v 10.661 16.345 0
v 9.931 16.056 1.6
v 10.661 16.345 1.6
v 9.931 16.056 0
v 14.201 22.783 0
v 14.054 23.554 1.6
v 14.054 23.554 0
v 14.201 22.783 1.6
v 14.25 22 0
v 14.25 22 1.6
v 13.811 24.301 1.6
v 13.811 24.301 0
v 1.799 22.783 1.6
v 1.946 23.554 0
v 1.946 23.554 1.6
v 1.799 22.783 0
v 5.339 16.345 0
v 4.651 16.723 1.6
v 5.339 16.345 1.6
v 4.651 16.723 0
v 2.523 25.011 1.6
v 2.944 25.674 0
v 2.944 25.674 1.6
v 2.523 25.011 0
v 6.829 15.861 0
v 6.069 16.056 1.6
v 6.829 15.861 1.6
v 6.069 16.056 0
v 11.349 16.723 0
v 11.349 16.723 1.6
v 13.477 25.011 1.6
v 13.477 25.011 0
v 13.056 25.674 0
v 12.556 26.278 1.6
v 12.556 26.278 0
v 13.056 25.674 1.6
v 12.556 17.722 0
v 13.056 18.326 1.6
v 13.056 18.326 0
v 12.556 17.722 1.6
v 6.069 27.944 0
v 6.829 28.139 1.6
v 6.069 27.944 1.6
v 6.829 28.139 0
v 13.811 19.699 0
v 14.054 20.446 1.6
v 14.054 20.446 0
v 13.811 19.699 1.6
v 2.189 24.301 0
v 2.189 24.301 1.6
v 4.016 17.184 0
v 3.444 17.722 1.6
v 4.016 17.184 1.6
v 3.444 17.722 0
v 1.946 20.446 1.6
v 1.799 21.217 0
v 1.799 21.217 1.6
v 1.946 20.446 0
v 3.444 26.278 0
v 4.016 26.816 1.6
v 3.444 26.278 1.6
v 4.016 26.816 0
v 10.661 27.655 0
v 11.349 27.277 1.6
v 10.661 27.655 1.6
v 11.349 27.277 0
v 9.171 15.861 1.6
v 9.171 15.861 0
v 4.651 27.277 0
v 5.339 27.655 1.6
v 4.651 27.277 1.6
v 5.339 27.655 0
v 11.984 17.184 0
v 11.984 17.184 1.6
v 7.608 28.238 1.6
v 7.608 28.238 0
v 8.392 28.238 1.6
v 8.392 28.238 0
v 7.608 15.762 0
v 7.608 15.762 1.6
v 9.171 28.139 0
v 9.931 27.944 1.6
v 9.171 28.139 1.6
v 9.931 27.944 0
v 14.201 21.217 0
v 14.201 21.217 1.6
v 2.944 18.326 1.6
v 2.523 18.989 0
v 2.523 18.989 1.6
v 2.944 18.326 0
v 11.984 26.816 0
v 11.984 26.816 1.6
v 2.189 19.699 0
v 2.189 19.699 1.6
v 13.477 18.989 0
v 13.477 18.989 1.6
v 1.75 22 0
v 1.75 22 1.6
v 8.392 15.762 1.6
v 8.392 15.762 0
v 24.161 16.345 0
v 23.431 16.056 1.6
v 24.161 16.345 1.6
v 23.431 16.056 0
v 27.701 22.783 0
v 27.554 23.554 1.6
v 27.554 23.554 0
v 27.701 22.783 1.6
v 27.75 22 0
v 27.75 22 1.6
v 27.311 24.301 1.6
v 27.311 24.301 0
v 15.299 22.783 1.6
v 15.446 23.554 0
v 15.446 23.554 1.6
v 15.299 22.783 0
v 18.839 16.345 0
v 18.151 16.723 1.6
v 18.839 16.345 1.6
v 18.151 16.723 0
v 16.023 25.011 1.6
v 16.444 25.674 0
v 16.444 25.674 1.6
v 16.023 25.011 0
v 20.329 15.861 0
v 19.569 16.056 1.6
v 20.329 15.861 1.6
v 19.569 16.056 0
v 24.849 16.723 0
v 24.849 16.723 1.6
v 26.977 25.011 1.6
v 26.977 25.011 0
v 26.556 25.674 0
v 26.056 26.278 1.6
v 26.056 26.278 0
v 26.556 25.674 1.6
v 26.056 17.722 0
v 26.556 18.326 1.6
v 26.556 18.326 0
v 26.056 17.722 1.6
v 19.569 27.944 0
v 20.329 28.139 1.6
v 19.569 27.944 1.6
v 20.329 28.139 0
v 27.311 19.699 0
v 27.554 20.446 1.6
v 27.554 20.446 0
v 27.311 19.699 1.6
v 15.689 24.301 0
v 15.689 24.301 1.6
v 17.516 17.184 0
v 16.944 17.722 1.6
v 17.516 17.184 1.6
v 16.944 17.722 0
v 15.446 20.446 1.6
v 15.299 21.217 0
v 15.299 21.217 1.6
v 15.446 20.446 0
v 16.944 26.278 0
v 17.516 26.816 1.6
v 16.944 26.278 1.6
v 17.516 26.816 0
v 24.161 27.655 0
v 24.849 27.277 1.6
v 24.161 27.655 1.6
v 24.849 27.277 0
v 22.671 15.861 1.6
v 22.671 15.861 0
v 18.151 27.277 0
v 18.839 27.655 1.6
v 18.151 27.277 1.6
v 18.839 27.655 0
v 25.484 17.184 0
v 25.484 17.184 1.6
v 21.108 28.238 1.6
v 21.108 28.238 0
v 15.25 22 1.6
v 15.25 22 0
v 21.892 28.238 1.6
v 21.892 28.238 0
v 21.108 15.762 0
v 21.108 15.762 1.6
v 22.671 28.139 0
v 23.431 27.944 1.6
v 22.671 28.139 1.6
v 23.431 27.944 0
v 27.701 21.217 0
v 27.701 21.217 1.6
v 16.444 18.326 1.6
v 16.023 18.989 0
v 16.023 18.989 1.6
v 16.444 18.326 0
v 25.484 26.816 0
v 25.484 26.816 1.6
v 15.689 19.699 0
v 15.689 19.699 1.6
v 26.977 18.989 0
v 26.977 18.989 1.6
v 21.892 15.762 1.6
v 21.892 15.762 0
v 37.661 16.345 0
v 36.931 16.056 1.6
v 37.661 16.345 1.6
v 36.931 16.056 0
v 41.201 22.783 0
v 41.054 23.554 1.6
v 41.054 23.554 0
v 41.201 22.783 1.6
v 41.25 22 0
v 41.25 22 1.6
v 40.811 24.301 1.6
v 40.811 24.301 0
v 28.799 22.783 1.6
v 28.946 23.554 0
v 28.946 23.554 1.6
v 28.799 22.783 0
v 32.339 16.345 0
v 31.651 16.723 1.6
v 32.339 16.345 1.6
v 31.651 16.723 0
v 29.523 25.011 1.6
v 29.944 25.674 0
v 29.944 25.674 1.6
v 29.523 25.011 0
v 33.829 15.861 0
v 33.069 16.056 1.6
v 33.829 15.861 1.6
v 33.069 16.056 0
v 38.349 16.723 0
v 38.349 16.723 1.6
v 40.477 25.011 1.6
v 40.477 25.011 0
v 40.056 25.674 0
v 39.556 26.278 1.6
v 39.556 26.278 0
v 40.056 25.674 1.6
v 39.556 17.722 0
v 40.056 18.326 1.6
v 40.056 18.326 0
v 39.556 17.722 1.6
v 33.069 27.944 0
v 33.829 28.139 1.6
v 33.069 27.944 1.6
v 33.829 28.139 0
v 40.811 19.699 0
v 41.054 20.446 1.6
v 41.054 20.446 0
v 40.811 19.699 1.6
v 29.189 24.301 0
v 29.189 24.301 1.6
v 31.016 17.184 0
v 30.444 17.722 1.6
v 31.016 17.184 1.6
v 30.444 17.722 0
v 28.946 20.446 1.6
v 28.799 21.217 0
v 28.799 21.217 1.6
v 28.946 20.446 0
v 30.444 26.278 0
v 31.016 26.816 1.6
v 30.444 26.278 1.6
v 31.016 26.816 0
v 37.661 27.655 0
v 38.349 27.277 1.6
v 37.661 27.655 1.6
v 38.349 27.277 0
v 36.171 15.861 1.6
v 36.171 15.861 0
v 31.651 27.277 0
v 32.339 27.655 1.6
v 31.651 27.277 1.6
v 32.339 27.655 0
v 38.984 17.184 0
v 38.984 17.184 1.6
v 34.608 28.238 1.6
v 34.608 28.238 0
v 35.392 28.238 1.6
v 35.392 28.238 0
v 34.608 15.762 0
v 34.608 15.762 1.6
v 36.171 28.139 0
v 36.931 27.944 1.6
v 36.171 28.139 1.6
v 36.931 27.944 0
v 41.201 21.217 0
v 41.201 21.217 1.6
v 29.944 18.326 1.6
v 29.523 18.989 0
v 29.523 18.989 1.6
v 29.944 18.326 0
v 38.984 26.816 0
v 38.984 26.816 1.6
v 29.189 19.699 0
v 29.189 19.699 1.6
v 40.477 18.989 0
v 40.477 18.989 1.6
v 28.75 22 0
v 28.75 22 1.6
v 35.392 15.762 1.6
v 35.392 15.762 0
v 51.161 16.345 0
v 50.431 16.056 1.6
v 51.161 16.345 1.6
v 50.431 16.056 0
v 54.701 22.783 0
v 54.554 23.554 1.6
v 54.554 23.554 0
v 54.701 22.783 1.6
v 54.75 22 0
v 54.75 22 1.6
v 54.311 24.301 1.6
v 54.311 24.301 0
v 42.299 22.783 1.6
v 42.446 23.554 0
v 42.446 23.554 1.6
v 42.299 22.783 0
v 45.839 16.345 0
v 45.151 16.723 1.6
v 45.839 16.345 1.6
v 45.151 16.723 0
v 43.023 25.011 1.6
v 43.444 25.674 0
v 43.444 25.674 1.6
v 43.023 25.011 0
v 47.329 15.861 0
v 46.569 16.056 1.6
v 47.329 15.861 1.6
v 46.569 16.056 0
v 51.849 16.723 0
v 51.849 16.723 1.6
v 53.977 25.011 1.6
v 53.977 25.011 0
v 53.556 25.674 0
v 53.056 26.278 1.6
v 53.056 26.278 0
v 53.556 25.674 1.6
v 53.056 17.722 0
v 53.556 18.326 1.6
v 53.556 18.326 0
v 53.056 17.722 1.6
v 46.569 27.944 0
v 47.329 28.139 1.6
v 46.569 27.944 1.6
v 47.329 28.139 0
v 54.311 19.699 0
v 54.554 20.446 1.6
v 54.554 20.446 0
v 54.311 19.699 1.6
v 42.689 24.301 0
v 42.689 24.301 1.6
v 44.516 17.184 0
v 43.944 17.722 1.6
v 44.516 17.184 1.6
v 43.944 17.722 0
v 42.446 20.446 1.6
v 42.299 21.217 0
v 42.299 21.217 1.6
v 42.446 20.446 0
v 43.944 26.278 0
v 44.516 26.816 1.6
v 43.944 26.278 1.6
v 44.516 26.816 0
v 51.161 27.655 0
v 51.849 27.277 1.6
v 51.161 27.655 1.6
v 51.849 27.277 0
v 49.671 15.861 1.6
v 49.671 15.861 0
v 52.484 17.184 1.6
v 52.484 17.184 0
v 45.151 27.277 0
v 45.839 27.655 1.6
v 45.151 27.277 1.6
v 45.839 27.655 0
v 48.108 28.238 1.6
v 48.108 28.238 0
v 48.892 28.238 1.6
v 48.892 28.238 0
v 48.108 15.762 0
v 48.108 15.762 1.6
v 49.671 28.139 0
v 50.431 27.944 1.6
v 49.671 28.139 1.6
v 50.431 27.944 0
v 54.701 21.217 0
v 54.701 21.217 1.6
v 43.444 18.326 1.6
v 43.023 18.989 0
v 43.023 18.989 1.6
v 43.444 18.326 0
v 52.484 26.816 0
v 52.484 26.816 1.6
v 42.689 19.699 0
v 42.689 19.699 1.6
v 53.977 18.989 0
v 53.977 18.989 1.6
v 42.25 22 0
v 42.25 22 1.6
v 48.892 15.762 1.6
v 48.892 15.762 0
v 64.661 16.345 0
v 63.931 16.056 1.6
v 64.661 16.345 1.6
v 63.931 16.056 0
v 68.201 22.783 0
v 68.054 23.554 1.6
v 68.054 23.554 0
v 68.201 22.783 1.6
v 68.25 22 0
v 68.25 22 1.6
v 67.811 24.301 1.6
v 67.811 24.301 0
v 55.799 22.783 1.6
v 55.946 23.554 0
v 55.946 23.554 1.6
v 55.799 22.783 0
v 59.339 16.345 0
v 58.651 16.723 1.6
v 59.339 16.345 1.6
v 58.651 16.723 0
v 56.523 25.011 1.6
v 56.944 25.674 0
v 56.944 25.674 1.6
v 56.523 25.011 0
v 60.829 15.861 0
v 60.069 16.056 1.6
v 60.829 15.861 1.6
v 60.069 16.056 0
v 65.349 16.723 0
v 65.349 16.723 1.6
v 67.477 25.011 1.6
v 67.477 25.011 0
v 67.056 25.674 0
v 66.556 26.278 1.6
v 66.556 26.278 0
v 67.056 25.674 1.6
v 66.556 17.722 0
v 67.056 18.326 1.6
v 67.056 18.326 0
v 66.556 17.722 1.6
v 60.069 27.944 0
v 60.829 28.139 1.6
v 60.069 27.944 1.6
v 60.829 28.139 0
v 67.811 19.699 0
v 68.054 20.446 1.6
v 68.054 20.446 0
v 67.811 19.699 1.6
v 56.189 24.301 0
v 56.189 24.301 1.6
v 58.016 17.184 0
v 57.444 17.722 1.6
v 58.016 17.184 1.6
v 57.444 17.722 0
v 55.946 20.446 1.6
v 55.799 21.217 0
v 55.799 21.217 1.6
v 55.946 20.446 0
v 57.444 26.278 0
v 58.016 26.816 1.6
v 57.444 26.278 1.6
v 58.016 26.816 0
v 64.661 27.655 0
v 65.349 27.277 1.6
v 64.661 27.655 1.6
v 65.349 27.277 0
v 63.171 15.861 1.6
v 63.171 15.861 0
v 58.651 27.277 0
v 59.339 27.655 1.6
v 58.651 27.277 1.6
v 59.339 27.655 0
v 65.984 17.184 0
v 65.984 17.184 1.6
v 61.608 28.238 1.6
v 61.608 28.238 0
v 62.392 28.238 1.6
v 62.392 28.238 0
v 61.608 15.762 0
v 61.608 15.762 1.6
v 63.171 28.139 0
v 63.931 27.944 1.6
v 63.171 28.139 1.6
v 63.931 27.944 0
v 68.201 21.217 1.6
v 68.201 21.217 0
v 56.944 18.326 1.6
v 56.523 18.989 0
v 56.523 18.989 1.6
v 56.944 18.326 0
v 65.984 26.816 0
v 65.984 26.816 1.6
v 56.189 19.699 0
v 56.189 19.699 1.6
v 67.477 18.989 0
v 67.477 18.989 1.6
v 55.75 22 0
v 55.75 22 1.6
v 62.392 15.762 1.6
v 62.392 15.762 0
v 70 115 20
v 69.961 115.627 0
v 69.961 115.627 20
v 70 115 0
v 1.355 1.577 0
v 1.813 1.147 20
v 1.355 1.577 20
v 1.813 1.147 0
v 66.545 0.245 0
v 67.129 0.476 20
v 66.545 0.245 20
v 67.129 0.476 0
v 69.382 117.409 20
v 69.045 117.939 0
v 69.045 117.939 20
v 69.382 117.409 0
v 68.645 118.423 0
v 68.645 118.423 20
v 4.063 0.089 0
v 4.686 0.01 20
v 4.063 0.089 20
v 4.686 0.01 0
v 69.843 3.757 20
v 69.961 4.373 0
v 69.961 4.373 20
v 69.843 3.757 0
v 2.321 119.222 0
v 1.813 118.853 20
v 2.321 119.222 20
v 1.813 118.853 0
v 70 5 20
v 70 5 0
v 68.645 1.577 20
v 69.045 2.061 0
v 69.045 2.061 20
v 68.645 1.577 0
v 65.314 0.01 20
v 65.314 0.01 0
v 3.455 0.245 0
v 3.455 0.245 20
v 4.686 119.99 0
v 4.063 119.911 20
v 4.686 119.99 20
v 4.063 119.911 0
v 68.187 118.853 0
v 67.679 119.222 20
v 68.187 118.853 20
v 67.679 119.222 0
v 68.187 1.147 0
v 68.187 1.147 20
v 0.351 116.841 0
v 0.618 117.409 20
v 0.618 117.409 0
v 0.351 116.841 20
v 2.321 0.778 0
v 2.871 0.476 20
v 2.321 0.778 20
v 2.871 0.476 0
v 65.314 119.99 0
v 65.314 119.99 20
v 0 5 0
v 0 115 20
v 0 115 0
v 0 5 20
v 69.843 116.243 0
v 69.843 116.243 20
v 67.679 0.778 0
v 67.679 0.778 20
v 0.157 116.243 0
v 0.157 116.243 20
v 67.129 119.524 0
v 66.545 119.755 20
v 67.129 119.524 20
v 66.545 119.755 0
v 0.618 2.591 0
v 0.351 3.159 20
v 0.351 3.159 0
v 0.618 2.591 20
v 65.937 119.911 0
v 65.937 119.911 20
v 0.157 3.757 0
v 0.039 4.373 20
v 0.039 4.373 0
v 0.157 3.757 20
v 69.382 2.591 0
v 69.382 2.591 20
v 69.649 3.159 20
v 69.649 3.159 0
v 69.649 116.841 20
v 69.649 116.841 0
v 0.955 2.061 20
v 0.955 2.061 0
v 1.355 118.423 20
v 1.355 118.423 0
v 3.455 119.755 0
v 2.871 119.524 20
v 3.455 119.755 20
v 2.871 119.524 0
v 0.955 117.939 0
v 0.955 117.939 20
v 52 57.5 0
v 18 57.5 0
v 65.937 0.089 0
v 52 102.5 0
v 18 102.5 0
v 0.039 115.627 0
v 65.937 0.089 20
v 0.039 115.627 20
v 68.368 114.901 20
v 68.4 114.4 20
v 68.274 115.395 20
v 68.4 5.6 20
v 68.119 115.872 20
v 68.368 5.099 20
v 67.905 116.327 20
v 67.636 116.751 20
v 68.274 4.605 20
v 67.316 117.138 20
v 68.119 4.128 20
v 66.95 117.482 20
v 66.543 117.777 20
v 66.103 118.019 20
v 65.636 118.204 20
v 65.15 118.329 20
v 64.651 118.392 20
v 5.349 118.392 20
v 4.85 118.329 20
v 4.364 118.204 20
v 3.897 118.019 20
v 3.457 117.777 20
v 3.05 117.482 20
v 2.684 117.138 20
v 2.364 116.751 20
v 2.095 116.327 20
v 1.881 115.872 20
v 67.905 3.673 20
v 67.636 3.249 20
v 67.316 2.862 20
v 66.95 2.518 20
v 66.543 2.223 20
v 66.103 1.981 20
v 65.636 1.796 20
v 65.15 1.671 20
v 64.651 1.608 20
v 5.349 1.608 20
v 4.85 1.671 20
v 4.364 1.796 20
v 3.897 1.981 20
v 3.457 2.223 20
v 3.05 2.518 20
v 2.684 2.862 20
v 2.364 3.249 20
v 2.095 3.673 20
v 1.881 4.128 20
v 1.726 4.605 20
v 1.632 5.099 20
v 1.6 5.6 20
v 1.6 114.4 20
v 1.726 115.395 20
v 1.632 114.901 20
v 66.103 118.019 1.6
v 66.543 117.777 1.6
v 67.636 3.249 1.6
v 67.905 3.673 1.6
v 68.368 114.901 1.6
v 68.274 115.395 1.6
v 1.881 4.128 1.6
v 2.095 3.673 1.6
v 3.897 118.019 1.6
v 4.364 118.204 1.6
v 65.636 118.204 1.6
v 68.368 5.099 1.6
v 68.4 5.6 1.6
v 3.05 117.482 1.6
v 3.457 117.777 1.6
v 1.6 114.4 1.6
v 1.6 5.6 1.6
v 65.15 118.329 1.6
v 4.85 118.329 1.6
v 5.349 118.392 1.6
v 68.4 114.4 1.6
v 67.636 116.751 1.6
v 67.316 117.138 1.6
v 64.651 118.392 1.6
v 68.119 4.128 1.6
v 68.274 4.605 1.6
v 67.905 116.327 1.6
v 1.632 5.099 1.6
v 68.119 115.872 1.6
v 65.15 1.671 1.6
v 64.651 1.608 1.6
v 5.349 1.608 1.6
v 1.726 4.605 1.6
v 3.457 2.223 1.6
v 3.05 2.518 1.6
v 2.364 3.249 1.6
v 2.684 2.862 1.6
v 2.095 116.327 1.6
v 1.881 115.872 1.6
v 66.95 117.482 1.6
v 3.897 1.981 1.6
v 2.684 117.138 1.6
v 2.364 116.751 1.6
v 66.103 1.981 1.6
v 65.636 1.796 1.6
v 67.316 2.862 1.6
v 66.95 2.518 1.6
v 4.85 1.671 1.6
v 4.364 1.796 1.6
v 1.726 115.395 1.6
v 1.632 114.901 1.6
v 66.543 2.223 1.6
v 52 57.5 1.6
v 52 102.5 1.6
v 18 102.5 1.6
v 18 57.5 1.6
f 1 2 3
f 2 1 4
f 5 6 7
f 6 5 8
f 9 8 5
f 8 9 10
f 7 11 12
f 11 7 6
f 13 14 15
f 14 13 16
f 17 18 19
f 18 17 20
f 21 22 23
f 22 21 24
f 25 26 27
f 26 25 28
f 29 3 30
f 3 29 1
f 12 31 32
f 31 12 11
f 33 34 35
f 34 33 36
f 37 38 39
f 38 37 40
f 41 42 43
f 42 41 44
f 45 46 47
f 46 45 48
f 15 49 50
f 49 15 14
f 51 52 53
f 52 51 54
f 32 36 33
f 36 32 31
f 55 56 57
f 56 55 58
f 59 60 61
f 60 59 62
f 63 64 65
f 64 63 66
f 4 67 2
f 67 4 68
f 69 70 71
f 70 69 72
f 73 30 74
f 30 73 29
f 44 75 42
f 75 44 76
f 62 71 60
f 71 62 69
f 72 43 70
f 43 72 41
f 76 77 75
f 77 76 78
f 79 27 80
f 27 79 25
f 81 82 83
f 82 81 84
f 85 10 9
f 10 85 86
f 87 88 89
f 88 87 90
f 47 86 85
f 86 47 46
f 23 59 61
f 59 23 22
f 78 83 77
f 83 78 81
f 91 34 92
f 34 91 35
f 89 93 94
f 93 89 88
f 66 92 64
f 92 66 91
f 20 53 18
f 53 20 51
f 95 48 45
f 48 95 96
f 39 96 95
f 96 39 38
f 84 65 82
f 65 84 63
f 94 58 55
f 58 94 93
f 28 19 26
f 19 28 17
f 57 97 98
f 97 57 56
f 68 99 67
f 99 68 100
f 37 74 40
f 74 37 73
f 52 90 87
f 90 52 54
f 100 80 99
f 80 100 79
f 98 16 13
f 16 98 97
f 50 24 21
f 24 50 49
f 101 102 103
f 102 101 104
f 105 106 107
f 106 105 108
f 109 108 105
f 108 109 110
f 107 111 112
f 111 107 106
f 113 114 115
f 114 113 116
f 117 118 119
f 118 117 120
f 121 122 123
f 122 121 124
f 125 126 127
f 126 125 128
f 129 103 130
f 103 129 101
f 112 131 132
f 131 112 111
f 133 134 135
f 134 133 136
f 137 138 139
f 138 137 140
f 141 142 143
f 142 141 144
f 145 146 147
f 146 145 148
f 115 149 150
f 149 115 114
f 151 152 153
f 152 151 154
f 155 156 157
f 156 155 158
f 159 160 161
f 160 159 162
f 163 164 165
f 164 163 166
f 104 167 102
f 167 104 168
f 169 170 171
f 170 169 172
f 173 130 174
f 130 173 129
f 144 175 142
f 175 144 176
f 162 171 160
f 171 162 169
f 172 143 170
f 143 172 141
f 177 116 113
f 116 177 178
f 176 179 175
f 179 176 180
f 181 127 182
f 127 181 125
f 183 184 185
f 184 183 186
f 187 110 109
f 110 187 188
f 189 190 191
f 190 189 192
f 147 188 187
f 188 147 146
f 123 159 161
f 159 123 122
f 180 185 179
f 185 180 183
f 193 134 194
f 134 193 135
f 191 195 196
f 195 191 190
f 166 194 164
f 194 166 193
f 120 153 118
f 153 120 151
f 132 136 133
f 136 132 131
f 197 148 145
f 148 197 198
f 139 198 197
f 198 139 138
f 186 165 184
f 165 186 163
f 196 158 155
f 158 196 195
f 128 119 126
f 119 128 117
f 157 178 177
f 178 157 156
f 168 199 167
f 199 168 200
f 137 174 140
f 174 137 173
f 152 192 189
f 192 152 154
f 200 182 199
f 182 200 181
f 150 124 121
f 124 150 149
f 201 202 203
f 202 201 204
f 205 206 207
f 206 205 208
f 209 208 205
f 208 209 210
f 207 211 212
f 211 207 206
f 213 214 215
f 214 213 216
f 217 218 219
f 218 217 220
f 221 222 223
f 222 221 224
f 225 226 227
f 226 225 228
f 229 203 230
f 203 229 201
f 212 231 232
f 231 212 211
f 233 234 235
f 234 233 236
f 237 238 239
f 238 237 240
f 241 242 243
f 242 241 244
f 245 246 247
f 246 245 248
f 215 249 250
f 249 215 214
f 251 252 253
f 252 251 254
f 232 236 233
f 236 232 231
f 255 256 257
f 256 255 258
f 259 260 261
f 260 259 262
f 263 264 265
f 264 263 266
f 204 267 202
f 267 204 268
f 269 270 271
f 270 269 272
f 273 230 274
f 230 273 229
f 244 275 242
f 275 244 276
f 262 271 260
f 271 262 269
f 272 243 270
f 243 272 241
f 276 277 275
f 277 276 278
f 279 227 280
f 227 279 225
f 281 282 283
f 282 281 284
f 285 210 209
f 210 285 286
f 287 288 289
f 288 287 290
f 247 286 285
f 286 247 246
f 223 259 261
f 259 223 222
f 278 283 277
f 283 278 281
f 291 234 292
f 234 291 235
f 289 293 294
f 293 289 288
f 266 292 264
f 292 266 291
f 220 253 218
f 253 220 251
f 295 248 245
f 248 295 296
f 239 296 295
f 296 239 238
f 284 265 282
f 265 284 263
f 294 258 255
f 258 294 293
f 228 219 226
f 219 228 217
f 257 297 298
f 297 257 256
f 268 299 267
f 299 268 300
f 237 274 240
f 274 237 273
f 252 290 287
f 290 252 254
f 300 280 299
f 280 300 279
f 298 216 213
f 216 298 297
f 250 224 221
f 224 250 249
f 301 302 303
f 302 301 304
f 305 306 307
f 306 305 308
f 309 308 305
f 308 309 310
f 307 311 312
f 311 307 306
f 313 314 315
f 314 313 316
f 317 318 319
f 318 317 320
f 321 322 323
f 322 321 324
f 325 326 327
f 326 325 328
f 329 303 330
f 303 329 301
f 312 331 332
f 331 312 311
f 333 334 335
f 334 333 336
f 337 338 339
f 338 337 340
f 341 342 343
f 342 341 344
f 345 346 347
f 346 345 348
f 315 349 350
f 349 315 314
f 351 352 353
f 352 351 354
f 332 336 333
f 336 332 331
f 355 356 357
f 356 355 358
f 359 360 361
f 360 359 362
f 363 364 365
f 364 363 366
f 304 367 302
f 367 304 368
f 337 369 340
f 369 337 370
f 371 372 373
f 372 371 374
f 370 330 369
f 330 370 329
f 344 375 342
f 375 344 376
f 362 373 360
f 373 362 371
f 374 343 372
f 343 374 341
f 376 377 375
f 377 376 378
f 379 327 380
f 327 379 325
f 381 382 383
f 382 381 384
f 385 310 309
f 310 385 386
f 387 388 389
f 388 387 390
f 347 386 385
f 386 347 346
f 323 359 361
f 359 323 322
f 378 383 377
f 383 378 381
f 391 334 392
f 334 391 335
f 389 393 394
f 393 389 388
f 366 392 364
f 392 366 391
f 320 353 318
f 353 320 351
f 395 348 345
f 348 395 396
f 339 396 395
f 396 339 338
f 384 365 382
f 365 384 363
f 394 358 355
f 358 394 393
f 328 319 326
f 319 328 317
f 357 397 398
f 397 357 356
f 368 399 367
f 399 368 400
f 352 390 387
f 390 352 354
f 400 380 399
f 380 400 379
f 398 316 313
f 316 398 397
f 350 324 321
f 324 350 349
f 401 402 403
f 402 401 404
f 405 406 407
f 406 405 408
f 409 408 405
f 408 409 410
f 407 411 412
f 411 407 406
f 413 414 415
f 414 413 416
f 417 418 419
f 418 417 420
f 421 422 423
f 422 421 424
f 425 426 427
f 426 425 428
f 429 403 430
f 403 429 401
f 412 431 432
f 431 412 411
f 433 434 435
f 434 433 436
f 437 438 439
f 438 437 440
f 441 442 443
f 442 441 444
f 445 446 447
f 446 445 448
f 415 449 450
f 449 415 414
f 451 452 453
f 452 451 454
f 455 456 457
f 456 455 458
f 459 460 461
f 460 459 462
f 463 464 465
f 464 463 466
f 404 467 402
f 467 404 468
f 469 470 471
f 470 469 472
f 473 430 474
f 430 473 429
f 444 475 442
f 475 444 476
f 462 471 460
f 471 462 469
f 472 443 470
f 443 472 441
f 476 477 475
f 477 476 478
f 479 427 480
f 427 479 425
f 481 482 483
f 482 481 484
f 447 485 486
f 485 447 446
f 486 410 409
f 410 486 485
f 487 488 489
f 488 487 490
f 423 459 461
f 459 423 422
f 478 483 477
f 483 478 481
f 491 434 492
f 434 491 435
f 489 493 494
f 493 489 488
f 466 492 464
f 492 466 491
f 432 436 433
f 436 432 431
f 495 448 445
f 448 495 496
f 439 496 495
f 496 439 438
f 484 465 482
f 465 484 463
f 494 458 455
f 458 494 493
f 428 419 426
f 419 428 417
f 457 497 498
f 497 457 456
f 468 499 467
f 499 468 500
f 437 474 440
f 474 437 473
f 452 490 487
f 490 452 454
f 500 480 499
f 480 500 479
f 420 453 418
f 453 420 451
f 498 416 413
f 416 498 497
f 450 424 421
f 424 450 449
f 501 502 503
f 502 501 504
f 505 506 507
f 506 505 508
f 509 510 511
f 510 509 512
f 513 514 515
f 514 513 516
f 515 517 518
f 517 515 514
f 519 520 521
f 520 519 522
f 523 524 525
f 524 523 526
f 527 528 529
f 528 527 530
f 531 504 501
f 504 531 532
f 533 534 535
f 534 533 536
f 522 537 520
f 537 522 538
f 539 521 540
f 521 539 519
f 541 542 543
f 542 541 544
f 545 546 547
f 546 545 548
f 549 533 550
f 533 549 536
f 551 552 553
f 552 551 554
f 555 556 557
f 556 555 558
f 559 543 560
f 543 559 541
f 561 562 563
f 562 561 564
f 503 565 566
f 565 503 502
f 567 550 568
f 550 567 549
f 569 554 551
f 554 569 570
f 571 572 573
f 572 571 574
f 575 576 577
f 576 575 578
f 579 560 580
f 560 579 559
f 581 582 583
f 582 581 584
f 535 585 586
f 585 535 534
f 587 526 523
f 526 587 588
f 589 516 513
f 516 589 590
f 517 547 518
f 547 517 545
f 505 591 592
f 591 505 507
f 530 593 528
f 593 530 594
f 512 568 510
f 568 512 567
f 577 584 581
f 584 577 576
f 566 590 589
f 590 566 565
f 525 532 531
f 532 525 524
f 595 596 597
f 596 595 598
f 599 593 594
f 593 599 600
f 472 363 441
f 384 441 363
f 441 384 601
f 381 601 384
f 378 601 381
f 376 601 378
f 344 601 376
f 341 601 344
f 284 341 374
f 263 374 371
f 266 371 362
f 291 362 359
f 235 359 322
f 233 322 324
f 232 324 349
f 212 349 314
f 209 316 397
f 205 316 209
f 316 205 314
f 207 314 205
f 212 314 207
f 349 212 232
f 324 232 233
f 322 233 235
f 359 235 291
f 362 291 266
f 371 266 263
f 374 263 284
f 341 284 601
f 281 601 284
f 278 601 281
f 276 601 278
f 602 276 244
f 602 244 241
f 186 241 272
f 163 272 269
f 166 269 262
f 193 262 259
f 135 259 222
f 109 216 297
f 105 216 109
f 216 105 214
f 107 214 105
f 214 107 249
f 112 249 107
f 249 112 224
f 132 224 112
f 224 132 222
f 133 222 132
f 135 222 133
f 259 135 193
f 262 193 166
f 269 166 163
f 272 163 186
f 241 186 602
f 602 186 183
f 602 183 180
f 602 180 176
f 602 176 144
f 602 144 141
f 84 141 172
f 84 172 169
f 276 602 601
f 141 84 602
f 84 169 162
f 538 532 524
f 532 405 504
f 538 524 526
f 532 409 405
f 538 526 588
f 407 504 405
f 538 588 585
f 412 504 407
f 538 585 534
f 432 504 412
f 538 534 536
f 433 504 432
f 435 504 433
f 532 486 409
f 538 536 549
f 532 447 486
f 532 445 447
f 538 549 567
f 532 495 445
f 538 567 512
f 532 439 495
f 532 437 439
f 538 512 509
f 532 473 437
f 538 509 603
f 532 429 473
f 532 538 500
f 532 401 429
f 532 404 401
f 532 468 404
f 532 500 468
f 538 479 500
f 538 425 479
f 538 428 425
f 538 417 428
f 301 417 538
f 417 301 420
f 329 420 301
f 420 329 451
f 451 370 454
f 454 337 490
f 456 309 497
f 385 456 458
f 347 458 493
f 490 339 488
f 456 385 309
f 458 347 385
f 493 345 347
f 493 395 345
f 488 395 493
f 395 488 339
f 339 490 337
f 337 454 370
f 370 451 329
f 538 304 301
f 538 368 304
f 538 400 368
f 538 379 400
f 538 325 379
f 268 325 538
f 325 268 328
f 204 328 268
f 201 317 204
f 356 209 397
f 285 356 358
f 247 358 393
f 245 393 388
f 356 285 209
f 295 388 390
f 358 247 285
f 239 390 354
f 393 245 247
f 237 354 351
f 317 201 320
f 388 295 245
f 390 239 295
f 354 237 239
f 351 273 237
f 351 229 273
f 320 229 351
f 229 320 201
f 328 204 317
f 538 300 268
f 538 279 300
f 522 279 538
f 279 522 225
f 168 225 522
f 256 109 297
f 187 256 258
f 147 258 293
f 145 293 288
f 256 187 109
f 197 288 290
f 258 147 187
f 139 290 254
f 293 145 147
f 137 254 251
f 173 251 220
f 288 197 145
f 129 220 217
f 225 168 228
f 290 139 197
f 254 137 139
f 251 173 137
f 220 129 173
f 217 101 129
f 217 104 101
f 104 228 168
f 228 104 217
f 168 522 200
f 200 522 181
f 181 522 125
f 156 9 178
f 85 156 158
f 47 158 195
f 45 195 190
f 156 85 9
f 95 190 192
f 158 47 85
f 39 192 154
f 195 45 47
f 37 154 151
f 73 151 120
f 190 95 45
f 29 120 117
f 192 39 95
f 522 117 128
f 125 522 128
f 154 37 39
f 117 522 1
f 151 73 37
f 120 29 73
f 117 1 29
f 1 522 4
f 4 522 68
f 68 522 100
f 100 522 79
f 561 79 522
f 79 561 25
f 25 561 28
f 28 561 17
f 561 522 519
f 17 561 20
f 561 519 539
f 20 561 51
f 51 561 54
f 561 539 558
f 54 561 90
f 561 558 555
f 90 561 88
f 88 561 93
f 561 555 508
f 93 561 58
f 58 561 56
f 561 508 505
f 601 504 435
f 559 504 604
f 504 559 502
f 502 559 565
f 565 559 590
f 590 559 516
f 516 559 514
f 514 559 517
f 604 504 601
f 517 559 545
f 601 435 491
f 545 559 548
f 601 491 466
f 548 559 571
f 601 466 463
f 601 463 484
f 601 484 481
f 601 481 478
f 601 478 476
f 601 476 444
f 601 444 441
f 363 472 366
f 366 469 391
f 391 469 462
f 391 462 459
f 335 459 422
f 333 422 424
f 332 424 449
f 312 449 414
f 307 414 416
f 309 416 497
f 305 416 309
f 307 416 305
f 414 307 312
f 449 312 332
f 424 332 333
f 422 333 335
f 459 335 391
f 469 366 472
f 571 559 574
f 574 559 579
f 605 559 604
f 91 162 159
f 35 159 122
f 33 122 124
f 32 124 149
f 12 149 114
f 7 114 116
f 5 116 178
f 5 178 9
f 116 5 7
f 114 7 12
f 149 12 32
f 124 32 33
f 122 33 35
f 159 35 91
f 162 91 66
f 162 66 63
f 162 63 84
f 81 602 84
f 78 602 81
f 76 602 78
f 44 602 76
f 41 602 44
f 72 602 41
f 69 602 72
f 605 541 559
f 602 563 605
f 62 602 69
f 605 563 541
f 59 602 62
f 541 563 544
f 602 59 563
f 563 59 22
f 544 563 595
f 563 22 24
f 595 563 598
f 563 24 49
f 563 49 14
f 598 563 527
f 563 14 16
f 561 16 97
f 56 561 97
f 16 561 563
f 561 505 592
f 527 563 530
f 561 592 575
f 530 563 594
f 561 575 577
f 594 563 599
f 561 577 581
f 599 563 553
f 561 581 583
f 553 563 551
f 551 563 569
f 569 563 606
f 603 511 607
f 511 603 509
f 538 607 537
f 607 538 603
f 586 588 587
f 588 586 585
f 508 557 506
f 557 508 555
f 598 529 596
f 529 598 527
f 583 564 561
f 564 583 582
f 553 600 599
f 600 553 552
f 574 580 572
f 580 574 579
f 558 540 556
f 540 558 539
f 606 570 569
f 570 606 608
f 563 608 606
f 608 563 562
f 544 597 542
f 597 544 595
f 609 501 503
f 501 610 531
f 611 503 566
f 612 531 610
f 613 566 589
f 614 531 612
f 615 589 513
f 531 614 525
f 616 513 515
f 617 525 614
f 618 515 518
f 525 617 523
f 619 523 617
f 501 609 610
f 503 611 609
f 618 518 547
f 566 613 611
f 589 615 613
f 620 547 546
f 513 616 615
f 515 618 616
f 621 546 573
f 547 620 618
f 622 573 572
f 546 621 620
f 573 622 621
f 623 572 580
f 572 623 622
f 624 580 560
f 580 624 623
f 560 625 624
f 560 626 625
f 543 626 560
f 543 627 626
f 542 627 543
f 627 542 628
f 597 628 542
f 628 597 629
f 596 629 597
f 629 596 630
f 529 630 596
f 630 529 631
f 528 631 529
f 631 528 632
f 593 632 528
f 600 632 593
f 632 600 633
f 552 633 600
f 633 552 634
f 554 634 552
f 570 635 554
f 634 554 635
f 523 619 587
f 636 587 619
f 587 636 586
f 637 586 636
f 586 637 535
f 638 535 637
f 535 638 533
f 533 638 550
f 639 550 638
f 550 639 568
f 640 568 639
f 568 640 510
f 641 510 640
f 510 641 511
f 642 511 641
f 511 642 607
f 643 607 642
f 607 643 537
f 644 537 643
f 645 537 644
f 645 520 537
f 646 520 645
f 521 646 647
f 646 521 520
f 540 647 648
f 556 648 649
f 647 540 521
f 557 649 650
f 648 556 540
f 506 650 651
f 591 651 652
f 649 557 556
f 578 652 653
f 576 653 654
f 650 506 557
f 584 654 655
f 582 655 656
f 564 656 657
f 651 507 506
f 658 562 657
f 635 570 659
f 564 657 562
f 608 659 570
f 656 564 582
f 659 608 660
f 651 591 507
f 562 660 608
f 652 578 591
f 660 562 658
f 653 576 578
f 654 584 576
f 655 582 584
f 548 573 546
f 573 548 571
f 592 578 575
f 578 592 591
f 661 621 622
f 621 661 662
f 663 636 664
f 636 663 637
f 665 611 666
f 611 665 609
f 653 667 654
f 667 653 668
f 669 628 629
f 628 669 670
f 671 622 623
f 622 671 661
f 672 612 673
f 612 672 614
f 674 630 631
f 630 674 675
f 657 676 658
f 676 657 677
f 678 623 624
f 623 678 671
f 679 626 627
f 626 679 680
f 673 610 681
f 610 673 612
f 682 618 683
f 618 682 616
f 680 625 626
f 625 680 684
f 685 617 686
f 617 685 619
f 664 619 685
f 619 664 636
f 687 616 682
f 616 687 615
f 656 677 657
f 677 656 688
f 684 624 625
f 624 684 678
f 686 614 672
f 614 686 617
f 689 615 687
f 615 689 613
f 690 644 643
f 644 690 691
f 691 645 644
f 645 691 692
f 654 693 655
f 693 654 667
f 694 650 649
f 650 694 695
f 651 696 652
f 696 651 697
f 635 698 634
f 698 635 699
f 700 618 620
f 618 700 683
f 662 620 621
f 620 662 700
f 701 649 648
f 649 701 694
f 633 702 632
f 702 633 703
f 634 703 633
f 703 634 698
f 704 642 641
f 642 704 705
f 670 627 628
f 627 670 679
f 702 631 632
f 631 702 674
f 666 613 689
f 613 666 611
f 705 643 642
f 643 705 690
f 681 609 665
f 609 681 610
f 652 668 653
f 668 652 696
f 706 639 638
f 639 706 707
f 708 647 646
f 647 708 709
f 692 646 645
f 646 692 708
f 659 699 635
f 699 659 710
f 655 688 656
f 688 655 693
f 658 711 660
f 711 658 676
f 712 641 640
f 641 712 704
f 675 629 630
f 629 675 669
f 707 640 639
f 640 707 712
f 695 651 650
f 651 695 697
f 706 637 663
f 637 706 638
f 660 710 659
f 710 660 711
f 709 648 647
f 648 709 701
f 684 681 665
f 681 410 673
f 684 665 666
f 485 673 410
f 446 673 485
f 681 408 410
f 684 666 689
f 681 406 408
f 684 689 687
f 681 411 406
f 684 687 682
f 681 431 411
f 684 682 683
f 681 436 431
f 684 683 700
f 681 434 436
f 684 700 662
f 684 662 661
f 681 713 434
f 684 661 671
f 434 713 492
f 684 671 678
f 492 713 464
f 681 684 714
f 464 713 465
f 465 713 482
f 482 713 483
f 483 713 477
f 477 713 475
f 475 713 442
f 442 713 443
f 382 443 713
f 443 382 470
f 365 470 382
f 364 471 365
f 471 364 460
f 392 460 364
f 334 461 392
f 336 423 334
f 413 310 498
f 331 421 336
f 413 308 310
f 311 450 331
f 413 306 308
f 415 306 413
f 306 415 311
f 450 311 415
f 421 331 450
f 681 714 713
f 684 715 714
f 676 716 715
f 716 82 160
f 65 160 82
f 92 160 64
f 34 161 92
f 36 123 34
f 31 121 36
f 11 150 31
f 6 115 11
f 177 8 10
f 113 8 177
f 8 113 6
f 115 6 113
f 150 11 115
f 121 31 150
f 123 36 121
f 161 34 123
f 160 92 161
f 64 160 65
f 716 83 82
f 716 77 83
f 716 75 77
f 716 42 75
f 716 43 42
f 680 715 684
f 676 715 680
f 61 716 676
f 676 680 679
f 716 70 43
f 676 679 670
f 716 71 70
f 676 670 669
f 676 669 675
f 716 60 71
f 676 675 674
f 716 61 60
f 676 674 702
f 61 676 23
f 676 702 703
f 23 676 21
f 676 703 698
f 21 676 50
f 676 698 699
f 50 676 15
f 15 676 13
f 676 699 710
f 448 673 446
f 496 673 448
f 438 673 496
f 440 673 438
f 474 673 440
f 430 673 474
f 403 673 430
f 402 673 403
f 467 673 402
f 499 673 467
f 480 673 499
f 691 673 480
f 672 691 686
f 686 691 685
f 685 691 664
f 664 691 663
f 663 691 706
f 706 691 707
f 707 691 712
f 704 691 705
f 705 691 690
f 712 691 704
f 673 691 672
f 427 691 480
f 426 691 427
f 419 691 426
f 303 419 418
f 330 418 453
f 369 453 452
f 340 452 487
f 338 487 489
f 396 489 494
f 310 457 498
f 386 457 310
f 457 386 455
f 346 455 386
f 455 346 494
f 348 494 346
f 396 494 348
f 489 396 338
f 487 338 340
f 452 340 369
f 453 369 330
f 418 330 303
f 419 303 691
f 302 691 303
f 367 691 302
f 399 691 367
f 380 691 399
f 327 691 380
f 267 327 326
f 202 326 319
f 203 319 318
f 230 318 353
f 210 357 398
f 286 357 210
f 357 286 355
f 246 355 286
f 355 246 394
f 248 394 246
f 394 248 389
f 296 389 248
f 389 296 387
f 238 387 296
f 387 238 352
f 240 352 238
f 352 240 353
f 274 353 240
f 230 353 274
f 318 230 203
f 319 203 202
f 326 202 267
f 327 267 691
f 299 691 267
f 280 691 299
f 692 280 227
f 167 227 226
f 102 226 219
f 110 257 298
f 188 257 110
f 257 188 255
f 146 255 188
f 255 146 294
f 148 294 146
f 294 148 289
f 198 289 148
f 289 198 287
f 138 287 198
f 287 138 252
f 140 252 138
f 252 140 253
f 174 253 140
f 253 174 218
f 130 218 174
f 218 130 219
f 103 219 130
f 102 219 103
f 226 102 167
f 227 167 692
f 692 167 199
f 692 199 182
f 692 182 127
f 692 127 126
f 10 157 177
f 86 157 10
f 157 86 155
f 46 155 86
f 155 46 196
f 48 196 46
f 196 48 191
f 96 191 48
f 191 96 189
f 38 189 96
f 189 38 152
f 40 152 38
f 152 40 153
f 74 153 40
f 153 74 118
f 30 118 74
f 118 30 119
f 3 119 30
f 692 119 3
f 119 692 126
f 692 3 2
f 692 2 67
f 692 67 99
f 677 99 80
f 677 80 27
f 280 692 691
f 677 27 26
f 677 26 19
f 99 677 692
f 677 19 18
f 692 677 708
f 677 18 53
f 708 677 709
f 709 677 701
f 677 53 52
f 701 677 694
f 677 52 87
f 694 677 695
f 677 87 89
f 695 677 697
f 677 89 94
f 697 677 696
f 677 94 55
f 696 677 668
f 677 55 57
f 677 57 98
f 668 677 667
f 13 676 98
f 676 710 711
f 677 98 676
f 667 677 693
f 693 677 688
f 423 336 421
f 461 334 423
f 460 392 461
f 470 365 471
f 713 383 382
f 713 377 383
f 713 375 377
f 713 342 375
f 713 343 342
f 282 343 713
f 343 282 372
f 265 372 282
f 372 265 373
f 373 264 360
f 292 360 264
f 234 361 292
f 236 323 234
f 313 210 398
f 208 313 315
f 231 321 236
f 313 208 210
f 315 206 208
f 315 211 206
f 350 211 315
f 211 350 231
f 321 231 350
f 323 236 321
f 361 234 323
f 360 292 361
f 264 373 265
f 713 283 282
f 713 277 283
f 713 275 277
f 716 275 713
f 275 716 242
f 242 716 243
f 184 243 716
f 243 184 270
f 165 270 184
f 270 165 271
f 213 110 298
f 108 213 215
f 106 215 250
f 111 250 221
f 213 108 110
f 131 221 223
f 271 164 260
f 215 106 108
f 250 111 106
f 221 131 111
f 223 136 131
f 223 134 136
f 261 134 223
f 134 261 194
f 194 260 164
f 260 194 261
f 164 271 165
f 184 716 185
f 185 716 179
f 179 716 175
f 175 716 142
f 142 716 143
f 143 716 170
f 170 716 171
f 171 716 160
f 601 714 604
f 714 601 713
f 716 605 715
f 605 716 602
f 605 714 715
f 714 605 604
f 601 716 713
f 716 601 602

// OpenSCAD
// ==========================================
// NOVA PAY EDC REPLICA - MASTER PROJECT FILE
// Optimized for Bambu Lab A1 Mini (No Supports, < 1 Hour)
// ==========================================

// --- GLOBAL DIMENSIONS ---
length = 120;
width = 70;
top_height = 20;     // Deep enough to clear ESP32 jumper wires
bottom_height = 8;
wall = 1.6;          // Fast printing (4 perimeters on 0.4mm nozzle)
radius = 5;
tolerance = 0.2;     // Snug friction fit gap

// Helper Module for Rounded Boxes (Keeps code clean)
module rounded_box(l, w, h, r) {
    hull() {
        translate([r, r, 0]) cylinder(h=h, r=r, $fn=50);
        translate([w-r, r, 0]) cylinder(h=h, r=r, $fn=50);
        translate([r, l-r, 0]) cylinder(h=h, r=r, $fn=50);
        translate([w-r, l-r, 0]) cylinder(h=h, r=r, $fn=50);
    }
}

// ==========================================
// 1. TOP HALF (FACEPLATE)
// ==========================================
module top_half() {
    screen_w = 34; 
    screen_h = 45;
    screen_offset_y = 20; 
    button_hole_d = 12.5; 
    button_spacing = 13.5;

    difference() {
        // Main Shell
        rounded_box(length, width, top_height, radius);
        
        // Hollow inside
        translate([wall, wall, wall])
            rounded_box(length - 2*wall, width - 2*wall, top_height, radius-1);
            
        // Screen Cutout
        translate([width/2 - screen_w/2, length/2 + screen_offset_y - screen_h/2, -1])
            cube([screen_w, screen_h, wall + 2]);
            
        // 5 Push Button Cutouts
        for(i=[-2:2]) {
            translate([width/2 + (i*button_spacing), 22, -1])
                cylinder(h=wall+2, d=button_hole_d, $fn=50);
        }
    }
}

// ==========================================
// 2. BOTTOM HALF (MOTHERBOARD & RFID TRAY)
// ==========================================
module bottom_half() {
    lip_height = 3;      
    lip_wall = 1.2; 
    usb_w = 12;
    usb_h = 6;
    usb_offset_y = 85; // Moved up to align with ESP32 in the Top Zone
    
    rfid_w = 40.5;
    rfid_l = 60.5;
    rfid_h = 4;
    
    union() {
        difference() {
            // Main Bottom Shell
            rounded_box(length, width, bottom_height, radius);
            
            // Hollow inside
            translate([wall, wall, wall])
                rounded_box(length - 2*wall, width - 2*wall, bottom_height, radius-1);
                
            // USB-C Port Cutout
            translate([width - wall - 1, usb_offset_y, wall + 0.5])
                cube([wall + 2, usb_w, usb_h]);
        }

        // Friction-Fit Lip
        translate([wall + tolerance, wall + tolerance, bottom_height])
        difference() {
            rounded_box(length - 2*(wall + tolerance), width - 2*(wall + tolerance), lip_height, radius - 1);
            
            translate([lip_wall, lip_wall, -1])
                rounded_box(length - 2*(wall + tolerance + lip_wall), width - 2*(wall + tolerance + lip_wall), lip_height + 2, radius - 2);
        }
        
        // RC522 Bracket (Centered X, Bottom Y)
        b_wall = 1.2;
        translate([(width - rfid_w) / 2, 10, wall]) 
        difference() {
            translate([-b_wall, -b_wall, 0])
                cube([rfid_w + 2*b_wall, rfid_l + 2*b_wall, rfid_h]);
            cube([rfid_w, rfid_l, rfid_h + 1]);
            // Huge center cutout for pins and saving plastic
            translate([3, 3, -1])
                cube([rfid_w - 6, rfid_l - 6, rfid_h + 2]);
        }
    }
}

// ==========================================
// 3. DESKTOP DOCK (KICKSTAND)
// ==========================================
module desktop_dock() {
    term_w = width + 1; // 1mm clearance 
    term_th = top_height + bottom_height + 1; 
    tilt = 20;

    difference() {
        hull() {
            translate([5, 5, 0]) cylinder(h=2, r=5, $fn=50);
            translate([term_w+5, 5, 0]) cylinder(h=2, r=5, $fn=50);
            translate([5, 60, 0]) cylinder(h=2, r=5, $fn=50);
            translate([term_w+5, 60, 0]) cylinder(h=2, r=5, $fn=50);
            
            translate([5, 50, 40]) cylinder(h=2, r=5, $fn=50);
            translate([term_w+5, 50, 40]) cylinder(h=2, r=5, $fn=50);
            
            translate([5, 5, 12]) cylinder(h=2, r=5, $fn=50);
            translate([term_w+5, 5, 12]) cylinder(h=2, r=5, $fn=50);
        }
        
        translate([5, 12, 8]) 
            rotate([tilt, 0, 0]) 
            cube([term_w, term_th, 60]);
            
        translate([15, 15, -1]) 
            cube([term_w - 20, 35, 30]);
    }
}

// ==========================================
// RENDER SECTION (Comment out what you don't need)
// ==========================================

// Faceplate
top_half();

// Back Cover (Moved 80mm to the right for visibility)
//translate([80, 0, 0]) 
//bottom_half();

// Dock (Moved 160mm to the right for visibility)
///translate([160, 0, 0]) 
//desktop_dock();
